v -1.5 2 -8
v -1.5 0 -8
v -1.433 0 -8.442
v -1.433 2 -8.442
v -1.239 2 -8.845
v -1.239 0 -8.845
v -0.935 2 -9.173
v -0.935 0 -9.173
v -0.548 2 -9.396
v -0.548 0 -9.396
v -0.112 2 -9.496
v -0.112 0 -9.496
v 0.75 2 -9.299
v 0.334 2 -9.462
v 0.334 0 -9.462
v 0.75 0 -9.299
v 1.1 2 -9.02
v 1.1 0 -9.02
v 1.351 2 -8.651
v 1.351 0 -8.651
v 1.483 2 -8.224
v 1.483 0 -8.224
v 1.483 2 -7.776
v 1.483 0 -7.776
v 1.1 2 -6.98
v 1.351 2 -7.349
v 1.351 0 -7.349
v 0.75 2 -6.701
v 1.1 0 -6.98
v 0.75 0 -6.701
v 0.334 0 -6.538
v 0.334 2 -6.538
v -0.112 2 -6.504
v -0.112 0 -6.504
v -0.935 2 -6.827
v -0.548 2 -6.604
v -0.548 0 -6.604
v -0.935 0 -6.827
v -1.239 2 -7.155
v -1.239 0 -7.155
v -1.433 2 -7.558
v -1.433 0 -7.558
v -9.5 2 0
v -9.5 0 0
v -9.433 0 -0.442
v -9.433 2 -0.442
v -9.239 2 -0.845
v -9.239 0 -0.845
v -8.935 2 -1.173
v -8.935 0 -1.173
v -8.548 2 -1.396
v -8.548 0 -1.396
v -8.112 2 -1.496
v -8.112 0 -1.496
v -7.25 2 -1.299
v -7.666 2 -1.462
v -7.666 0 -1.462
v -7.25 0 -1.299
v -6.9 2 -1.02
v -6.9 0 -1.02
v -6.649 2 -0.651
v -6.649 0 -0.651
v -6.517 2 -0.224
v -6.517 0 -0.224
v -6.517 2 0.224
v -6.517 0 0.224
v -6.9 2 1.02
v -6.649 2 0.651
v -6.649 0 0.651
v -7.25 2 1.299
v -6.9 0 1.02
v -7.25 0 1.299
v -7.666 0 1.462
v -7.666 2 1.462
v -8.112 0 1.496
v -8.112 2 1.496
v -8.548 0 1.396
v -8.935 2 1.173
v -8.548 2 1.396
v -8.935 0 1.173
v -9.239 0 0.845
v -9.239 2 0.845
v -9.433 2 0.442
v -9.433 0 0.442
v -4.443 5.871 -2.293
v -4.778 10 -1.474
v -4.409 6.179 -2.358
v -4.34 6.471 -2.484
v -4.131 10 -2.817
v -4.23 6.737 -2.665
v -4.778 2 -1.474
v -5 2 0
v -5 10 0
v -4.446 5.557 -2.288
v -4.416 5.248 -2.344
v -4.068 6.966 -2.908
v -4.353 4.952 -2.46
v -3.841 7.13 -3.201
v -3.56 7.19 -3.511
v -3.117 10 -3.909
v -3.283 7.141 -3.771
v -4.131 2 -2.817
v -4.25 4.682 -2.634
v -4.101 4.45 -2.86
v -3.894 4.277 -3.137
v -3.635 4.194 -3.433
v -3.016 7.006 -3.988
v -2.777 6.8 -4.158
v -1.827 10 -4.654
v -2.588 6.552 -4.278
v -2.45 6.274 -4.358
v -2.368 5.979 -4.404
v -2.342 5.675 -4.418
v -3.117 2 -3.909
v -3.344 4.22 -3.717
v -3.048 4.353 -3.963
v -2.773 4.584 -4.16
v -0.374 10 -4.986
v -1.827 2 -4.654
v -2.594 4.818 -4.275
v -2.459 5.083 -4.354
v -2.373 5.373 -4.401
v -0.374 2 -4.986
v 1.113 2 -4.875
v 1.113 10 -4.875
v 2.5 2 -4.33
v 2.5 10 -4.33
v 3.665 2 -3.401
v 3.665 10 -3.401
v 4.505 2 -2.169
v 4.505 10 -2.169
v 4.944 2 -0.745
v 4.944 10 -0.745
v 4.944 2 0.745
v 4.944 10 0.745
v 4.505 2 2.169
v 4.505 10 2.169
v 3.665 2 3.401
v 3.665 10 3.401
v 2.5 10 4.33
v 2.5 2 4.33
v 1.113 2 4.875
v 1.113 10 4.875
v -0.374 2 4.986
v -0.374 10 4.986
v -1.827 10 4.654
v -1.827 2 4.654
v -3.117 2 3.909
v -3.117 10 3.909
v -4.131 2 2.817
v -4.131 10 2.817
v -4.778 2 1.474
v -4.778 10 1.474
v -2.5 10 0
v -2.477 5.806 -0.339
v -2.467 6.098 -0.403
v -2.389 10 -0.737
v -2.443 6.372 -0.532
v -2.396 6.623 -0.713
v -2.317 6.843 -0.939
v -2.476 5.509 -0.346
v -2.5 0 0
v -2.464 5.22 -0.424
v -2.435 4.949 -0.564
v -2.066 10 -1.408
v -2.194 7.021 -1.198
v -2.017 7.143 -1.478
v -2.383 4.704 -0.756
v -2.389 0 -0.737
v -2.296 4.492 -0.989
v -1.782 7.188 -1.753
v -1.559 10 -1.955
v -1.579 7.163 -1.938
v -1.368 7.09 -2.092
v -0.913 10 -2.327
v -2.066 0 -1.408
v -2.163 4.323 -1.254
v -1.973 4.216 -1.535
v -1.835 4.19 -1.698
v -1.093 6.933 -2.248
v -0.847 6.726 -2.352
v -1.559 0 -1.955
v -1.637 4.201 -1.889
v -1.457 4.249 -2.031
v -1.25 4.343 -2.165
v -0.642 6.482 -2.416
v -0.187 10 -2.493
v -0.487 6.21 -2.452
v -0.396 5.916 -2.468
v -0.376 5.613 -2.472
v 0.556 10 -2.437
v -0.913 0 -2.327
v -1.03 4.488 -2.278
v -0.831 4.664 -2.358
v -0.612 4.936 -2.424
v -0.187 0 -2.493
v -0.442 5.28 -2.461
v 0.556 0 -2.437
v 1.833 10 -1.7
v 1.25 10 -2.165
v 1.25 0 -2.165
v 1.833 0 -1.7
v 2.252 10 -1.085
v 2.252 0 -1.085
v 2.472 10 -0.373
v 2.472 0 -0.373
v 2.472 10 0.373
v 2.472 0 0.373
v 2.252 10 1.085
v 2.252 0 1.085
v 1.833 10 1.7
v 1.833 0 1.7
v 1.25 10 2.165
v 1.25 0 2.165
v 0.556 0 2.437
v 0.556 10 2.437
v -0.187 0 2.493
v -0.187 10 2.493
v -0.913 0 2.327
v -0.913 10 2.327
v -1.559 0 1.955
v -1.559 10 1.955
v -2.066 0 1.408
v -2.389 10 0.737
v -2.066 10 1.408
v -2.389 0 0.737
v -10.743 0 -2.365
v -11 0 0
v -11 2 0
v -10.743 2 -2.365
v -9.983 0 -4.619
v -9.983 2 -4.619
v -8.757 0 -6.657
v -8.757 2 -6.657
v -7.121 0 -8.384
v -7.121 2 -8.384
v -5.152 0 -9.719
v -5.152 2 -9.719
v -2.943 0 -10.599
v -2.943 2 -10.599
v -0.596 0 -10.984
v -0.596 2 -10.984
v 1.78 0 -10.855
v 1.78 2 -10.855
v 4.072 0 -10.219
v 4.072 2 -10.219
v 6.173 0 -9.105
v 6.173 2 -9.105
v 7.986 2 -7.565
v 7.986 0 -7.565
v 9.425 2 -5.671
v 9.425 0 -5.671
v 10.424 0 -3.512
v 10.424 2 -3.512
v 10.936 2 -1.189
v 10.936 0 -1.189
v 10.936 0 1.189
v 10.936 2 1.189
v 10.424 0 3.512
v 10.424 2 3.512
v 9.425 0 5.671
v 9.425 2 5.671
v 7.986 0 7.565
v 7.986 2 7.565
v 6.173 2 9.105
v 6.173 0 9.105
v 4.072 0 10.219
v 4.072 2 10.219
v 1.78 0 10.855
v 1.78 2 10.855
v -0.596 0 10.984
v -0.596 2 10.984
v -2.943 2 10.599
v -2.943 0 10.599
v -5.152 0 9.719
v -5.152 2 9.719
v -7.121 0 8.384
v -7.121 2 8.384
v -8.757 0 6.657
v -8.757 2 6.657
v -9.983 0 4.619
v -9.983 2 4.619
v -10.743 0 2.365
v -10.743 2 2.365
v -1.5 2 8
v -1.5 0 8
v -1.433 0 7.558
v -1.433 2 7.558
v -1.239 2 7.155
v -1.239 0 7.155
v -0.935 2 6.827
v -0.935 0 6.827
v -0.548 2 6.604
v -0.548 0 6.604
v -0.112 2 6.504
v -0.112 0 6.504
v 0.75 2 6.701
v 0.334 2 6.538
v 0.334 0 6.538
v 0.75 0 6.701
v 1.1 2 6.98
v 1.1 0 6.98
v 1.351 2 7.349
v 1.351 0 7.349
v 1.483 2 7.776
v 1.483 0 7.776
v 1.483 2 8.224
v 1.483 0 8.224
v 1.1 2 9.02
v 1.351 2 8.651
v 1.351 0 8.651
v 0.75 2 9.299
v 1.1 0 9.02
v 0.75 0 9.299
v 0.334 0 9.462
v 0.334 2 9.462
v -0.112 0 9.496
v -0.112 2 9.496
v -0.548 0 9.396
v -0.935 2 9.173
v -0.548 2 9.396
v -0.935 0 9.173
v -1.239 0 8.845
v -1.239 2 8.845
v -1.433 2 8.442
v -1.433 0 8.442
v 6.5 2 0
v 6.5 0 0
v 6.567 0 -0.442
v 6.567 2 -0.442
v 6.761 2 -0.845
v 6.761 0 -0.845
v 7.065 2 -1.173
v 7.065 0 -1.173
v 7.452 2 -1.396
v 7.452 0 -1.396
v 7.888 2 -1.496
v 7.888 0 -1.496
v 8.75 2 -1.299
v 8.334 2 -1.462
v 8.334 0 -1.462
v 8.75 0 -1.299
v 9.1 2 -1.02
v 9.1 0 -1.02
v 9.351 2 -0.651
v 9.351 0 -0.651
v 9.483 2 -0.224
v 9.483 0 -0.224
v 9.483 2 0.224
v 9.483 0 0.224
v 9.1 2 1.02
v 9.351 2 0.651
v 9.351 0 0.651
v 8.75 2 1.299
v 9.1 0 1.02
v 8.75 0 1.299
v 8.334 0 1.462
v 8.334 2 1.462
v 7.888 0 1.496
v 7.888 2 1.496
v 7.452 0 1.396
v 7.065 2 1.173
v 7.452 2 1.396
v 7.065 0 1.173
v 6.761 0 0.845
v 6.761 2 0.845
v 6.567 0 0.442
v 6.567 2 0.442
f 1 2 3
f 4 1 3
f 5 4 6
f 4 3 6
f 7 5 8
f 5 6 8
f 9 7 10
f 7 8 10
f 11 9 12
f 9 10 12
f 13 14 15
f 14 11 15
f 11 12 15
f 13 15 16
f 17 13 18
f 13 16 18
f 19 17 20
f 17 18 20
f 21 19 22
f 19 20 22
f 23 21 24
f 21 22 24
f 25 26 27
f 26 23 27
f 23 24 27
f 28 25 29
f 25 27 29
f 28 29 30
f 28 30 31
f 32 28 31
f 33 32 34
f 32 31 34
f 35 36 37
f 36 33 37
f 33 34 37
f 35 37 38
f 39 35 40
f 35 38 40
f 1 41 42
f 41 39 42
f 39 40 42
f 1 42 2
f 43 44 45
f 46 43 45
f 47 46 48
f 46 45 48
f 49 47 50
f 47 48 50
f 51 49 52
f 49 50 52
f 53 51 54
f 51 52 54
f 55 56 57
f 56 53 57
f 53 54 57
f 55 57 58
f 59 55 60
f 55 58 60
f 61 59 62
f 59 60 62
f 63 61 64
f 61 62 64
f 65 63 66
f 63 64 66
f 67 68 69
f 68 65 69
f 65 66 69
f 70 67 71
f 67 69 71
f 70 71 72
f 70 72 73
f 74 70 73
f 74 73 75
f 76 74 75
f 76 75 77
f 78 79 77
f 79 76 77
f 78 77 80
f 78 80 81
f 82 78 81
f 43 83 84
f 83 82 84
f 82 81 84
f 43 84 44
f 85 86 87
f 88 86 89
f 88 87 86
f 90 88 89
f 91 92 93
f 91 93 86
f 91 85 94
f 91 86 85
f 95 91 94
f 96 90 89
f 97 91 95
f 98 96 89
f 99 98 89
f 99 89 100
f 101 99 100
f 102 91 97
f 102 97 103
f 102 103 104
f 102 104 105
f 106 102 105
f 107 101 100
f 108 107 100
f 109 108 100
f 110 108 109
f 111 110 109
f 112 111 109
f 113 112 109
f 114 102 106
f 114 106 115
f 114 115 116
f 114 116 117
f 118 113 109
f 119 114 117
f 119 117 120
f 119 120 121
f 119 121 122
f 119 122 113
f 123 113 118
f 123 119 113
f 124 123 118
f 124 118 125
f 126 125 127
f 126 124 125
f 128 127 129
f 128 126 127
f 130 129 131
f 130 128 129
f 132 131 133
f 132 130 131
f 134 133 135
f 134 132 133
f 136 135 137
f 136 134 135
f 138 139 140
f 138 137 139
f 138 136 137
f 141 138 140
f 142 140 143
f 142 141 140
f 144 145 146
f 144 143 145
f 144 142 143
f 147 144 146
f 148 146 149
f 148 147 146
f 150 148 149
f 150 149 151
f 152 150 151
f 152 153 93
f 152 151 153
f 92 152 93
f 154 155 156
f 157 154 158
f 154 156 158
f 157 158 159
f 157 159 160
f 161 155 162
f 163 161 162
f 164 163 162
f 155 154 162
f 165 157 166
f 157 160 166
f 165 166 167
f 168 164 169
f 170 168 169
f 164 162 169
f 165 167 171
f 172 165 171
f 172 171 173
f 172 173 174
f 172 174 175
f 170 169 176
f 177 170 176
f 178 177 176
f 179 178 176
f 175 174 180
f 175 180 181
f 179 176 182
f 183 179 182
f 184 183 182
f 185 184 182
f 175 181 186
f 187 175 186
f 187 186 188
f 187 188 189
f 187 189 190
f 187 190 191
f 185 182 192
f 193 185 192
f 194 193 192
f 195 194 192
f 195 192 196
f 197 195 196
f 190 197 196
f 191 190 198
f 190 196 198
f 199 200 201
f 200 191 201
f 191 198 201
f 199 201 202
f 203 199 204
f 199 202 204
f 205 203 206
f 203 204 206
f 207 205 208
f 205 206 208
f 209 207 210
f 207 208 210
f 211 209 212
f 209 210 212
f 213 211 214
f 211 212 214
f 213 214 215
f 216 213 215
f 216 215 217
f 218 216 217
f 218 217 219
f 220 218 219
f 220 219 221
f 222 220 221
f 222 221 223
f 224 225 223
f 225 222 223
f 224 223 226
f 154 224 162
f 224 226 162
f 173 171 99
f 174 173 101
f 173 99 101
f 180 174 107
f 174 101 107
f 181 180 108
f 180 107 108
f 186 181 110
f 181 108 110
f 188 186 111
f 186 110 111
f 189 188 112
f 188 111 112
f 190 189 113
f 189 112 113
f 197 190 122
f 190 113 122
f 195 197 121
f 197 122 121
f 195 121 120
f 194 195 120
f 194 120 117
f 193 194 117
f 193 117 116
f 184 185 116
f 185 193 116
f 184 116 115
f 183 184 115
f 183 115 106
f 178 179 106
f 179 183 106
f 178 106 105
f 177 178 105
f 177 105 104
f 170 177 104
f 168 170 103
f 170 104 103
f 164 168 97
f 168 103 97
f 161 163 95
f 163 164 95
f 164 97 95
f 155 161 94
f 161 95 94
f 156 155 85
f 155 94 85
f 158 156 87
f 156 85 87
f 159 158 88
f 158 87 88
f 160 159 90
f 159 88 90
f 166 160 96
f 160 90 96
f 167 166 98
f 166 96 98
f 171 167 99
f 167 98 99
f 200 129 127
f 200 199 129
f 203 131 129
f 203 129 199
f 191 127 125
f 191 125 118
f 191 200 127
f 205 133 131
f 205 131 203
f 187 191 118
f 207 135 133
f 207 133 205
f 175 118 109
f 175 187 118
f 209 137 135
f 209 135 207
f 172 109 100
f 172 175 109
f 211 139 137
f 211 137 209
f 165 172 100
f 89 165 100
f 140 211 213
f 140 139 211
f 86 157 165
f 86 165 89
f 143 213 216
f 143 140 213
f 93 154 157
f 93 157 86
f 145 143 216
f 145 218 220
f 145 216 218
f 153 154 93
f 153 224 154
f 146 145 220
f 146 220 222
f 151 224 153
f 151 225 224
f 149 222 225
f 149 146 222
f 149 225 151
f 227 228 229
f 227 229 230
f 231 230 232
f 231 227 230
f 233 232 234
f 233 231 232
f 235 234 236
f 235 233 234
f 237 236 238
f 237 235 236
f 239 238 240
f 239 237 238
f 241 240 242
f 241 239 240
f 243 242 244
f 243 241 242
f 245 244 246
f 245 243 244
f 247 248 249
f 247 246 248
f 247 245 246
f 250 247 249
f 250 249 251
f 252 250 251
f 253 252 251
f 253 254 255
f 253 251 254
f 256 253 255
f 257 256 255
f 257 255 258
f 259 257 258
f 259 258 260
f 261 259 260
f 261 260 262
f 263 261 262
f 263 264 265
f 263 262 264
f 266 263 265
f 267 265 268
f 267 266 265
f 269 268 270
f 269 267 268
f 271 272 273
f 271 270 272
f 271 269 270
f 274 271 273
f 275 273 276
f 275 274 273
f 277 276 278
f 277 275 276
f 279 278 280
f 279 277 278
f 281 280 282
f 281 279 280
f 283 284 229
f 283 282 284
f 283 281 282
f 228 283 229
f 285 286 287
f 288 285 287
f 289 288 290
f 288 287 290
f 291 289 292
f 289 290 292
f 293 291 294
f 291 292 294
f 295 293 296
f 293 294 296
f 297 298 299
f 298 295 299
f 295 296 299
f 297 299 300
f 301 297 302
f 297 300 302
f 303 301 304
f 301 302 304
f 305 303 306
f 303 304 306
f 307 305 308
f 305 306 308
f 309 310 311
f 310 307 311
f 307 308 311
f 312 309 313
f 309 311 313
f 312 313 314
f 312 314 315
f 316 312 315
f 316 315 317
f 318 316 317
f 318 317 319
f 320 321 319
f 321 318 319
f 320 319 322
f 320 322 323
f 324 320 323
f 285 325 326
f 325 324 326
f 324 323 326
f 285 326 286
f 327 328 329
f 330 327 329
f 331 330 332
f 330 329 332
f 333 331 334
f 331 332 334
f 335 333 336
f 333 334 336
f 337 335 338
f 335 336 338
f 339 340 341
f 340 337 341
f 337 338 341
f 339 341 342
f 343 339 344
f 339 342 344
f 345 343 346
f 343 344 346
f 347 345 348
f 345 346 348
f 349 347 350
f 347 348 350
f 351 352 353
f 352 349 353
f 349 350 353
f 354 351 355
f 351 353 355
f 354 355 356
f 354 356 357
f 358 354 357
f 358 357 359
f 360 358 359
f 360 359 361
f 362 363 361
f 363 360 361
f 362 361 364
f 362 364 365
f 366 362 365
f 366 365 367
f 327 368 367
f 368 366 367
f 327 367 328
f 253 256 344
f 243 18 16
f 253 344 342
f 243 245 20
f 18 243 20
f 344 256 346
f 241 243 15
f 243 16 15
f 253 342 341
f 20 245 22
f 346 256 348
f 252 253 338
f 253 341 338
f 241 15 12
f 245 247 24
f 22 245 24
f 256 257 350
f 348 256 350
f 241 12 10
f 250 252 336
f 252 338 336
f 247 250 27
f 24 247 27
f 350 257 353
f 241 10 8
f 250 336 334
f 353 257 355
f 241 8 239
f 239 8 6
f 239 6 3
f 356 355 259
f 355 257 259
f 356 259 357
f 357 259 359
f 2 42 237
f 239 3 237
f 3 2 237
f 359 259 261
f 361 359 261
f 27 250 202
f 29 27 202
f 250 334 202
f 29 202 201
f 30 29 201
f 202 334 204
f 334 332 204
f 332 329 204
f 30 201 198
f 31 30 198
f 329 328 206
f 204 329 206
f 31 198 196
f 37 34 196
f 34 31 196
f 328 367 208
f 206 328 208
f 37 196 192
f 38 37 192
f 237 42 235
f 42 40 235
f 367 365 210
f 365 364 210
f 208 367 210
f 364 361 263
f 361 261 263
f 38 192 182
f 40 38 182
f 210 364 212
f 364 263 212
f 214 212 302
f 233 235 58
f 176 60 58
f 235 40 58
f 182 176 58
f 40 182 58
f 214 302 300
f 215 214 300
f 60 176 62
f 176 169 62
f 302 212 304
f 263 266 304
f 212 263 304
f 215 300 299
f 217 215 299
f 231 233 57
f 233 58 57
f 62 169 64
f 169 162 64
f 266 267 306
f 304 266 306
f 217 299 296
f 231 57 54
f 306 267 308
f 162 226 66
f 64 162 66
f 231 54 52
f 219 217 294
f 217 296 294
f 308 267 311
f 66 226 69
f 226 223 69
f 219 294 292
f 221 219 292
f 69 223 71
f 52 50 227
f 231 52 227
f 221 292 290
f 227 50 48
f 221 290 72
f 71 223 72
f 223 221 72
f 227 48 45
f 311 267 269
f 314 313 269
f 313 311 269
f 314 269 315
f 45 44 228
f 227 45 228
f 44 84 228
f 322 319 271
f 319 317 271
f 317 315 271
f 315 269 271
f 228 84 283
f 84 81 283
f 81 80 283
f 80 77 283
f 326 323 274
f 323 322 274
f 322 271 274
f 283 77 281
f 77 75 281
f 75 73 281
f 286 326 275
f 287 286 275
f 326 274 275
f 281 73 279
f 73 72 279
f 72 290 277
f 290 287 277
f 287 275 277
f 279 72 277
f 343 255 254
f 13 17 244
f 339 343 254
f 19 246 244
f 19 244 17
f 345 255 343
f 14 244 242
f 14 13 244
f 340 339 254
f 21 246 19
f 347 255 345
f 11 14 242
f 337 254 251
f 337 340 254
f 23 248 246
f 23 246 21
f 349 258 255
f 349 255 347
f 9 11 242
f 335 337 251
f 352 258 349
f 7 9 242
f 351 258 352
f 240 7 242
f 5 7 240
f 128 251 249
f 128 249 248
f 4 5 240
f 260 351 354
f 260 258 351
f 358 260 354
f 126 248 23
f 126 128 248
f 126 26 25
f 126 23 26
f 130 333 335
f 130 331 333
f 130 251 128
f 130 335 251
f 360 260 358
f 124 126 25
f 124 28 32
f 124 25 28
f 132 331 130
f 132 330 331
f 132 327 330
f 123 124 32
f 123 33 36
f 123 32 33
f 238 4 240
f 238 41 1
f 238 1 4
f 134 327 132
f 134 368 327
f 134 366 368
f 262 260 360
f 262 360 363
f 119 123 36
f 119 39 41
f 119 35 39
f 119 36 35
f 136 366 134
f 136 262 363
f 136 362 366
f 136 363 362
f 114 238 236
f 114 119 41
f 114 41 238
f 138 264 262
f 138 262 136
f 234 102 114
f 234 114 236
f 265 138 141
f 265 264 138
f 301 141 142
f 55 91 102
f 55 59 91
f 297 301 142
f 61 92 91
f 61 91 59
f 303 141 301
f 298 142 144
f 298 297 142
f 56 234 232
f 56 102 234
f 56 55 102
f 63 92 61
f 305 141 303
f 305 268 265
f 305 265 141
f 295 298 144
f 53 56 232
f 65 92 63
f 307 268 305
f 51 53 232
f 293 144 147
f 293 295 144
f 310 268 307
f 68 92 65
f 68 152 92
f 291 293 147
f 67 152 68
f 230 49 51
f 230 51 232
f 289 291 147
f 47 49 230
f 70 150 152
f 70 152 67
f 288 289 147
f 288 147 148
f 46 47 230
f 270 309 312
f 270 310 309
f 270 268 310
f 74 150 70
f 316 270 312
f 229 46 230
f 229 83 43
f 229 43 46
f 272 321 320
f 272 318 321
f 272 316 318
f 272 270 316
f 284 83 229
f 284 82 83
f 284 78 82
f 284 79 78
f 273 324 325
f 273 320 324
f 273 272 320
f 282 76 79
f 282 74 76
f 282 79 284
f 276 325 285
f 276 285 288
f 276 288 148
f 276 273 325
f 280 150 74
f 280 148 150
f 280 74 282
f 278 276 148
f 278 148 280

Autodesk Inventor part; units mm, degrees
ref_plane "YZ Plane" through (0, 0, 0) normal (1, 0, 0) x (0, 1, 0)
ref_plane "XZ Plane" through (0, 0, 0) normal (0, 1, 0) x (-1, 0, 0)
ref_plane "XY Plane" through (0, 0, 0) normal (0, 0, 1) x (1, 0, 0)
sketch "Эскиз1" plane through (0, 0, 0) normal (0, 1, 0) x (-1, 0, 0)
  circle A0 centre (0, 0) radius 5
  circle A1 centre (0, 0) radius 2.5
  circle A2 centre (0, 0) radius 11
  circle A3 centre (8, 0) radius 1.5
  circle A4 centre (-8, 0) radius 1.5
  circle A5 centre (0, 8) radius 1.5
  circle A6 centre (0, -8) radius 1.5
  dimension "d0" = 5
  dimension "d1" = 10
  dimension "d2" = 22
  dimension "d3" = 3
  dimension "d4" = 3
  dimension "d5" = 16
  dimension "d6" = 8
  dimension "d7" = 3
  dimension "d8" = 3
  dimension "d9" = 8
  dimension "d10" = 8
  dimension "d11" = 16
extrude "Выдавливание1" add sketch "Эскиз1" along normal blind 2 contours A2
extrude "Выдавливание2" add sketch "Эскиз1" along normal blind 10 contours A0
sketch "Эскиз2" plane through (0, 0, 0) normal (1, 0, 0) x (0, 1, 0)
  point P0 (0, 0)
  point P1 (-0.4556, -12.0524)
  point P2 (8.9773, -12.0404)
sketch "Эскиз3" plane through (0, 0, 0) normal (0, 0, 1) x (1, 0, 0)
  point P0 (0, 0)
  point P1 (-11.9191, -0.1213)
  point P2 (-11.9191, 9.5232)
ref_plane "РабПлоскость1" through (0, -0.4556, -12.0524) normal (0.711, -0.0009, 0.7032) x (0, 1, 0.0013)
sketch "Эскиз4" plane through (0, -0.4556, -12.0524) normal (0.711, -0.0009, 0.7032) x (0, 1, 0.0013)
  circle A0 centre (6.1565, 8.569) radius 1.5
  point P0 (0.4709, 8.569)
  dimension "d16" = 3
extrude "Выдавливание3" cut sketch "Эскиз4" along normal up to surface
properties part number "Муфта"
